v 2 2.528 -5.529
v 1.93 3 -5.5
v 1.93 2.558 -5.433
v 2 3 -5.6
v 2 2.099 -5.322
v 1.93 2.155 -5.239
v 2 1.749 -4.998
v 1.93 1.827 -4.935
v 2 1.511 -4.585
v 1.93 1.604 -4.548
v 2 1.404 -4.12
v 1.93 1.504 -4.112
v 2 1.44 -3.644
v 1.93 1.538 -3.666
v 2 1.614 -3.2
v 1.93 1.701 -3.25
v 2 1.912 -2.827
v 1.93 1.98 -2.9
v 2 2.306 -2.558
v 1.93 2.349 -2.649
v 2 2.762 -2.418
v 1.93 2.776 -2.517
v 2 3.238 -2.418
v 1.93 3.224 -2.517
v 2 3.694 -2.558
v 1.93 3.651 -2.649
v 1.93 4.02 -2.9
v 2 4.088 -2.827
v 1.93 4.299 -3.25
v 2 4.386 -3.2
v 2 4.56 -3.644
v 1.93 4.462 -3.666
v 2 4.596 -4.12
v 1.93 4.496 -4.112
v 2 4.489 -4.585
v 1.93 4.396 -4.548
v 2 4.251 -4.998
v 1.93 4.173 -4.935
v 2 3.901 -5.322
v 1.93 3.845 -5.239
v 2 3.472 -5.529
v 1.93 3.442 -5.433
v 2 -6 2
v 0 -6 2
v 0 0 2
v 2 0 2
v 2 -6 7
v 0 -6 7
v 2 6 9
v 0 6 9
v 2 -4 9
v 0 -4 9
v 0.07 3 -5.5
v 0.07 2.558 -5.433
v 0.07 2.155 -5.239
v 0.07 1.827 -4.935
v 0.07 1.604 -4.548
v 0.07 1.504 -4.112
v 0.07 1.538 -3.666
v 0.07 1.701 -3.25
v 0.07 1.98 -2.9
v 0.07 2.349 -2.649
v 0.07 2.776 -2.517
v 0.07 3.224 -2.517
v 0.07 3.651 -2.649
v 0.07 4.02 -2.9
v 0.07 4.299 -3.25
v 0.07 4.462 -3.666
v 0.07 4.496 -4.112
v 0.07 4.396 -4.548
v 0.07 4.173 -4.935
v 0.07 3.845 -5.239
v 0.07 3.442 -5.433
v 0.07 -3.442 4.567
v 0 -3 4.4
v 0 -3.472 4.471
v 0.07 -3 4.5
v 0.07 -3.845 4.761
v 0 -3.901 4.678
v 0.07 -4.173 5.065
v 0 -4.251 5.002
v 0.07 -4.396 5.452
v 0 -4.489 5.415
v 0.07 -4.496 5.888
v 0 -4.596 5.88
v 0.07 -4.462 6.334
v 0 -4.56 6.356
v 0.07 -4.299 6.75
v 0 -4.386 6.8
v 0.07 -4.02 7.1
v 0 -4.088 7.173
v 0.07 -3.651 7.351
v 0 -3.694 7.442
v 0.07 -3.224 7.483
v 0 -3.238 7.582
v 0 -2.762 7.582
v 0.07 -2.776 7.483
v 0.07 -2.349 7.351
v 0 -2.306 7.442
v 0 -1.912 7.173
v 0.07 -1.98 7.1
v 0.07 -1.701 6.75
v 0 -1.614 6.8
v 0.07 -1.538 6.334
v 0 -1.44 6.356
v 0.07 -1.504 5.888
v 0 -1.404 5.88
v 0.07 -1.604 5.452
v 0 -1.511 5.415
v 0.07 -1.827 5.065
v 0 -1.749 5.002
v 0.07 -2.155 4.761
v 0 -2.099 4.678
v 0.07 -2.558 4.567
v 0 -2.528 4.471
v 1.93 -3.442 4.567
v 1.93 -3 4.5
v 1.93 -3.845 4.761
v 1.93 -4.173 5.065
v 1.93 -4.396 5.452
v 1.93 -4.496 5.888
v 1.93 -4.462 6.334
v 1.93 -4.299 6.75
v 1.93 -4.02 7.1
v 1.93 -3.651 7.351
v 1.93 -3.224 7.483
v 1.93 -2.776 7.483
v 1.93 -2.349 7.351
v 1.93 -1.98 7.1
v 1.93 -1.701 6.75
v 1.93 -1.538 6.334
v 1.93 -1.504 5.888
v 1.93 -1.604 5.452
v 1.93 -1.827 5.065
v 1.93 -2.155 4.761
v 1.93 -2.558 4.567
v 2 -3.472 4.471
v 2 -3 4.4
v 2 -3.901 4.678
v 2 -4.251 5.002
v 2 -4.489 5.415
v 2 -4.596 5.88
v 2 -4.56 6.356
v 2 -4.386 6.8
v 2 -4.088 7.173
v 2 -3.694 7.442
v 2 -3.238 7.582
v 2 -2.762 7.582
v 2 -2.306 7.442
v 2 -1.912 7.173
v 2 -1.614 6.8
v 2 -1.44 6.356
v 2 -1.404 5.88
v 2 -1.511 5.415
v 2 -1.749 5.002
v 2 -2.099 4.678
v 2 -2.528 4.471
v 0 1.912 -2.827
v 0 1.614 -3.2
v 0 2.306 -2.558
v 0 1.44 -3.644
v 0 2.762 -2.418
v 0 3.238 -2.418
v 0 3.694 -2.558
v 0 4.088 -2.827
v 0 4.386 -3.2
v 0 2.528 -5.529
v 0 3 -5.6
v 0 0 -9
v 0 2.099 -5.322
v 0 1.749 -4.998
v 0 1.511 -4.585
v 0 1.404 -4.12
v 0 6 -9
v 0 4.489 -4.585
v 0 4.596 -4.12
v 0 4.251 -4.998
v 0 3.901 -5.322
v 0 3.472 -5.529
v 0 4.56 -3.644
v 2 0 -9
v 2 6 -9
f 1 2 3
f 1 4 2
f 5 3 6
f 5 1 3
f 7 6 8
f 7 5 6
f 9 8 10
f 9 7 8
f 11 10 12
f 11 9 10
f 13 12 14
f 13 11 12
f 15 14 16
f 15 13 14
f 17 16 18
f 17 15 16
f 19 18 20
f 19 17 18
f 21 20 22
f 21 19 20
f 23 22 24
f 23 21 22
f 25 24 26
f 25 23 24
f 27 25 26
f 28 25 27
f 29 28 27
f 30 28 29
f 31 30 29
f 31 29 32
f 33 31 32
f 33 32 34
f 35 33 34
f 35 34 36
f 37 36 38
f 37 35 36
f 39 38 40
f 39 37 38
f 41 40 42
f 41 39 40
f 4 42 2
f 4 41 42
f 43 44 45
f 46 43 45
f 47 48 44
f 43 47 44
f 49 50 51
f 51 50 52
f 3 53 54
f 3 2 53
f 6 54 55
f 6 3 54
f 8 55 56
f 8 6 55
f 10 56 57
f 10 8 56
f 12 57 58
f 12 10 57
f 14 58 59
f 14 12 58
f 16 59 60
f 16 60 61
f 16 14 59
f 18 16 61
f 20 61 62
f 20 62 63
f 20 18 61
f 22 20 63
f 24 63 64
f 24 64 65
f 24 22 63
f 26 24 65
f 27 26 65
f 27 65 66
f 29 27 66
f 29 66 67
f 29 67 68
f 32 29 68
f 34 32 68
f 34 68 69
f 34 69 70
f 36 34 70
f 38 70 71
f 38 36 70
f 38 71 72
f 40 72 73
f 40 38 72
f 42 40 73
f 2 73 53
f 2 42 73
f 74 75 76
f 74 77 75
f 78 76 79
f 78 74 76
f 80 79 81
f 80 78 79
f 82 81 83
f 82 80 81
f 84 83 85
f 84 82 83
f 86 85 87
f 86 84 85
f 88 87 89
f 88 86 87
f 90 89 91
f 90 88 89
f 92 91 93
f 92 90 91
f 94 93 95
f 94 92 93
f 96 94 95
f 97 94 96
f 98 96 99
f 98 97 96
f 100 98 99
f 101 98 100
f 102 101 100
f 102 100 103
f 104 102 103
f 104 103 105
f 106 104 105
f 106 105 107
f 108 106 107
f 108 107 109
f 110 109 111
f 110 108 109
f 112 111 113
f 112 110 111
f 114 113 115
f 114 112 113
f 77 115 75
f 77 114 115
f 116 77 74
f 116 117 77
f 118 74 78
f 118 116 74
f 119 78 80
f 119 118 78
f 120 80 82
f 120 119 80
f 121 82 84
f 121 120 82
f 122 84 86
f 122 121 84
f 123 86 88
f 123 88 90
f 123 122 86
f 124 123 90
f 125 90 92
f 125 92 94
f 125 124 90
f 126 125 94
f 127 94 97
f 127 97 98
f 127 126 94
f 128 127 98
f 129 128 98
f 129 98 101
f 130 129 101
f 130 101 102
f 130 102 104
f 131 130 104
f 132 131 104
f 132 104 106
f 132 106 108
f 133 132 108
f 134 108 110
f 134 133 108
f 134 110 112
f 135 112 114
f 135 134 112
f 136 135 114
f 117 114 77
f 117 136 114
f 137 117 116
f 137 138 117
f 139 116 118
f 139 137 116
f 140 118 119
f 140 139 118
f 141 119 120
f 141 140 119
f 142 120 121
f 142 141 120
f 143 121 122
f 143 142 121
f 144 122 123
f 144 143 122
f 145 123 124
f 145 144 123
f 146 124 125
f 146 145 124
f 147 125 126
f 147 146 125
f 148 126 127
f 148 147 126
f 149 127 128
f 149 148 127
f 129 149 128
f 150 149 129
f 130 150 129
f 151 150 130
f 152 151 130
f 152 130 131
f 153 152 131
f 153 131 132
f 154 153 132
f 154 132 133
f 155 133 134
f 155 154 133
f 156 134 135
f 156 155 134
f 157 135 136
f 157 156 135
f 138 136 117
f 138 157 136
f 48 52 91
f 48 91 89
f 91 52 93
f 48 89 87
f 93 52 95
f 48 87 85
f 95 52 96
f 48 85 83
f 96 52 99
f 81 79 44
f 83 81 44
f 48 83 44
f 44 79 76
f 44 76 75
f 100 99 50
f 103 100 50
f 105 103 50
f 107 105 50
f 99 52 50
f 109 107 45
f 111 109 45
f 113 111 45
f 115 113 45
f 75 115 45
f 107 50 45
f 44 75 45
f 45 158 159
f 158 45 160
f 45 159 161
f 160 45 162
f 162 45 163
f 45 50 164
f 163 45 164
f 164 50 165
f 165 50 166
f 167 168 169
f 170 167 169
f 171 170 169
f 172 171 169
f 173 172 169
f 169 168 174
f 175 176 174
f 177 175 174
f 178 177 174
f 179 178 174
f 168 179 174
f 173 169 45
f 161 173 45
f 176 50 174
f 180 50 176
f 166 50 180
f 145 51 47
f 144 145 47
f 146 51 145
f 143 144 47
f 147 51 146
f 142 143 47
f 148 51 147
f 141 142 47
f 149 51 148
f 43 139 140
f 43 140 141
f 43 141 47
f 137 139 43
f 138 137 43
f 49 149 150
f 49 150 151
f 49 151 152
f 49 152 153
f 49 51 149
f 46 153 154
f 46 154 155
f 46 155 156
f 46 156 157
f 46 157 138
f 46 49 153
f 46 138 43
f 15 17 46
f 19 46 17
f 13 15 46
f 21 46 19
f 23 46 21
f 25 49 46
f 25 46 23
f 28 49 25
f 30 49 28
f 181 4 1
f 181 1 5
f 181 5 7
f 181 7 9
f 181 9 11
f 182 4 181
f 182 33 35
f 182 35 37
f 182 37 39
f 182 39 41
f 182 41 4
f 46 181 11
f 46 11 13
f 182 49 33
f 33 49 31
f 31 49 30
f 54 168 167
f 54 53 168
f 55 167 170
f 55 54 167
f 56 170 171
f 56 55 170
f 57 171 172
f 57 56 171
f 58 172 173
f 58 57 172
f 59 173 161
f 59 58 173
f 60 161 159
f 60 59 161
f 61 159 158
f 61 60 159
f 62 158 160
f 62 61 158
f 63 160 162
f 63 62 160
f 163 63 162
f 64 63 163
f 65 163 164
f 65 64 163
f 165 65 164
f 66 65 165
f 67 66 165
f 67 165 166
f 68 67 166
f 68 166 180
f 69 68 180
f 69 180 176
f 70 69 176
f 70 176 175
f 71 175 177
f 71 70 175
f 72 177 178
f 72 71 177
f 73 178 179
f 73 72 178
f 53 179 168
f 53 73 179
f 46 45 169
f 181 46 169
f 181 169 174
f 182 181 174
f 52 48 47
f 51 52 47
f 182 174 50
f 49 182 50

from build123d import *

# Parameters (mm, degrees)
EXTRUDE_1_DEPTH            = 2
HOLE_WIZARD_M31_AT_2_COUNT = 2
HOLE_WIZARD_M31_AT_2_PITCH = 11.66190379
CHAMFER_2_SIZE             = 2


with BuildPart() as part:
    # Эскиз1 → Бобышка-Вытянуть1 (new body)
    with BuildSketch(Plane(origin=(0, 0, 0), x_dir=(0, 0, -1), z_dir=(1, 0, 0))):
        Polygon((-9, -6), (-2, -6), (-2, 0), (9, 0), (9, 6), (-9, 6), align=None)
    extrude(amount=EXTRUDE_1_DEPTH)

    # Эскиз2 → Отверстие обработанное метчиком M31 (revolve, cut)
    with BuildSketch(Plane(origin=(2, 3, -4), x_dir=(0, 0, -1), z_dir=(0, 1, 0))):
        Polygon((0, 0), (0, 2), (1.6, 2), (1.5, 1.929979246), (1.5, 0.070020754), (1.6, 0), align=None)
    hole_wizard_m31 = revolve(axis=Axis((8.35, 3, -4), (-1, 0, 0)), mode=Mode.SUBTRACT)

    # Отверстие обработанное метчиком M31 at 2: Отверстие обработанное метчиком M31 ×2
    with Locations(*[Vector(0, -0.514495755, 0.857492926) * (i * HOLE_WIZARD_M31_AT_2_PITCH) for i in range(1, HOLE_WIZARD_M31_AT_2_COUNT)]):
        add(hole_wizard_m31, mode=Mode.SUBTRACT)

    # Фаска2
    chamfer_2_edges = [part.edges().sort_by_distance(p)[0] for p in [
        (1, -6, 9),
    ]]
    chamfer(chamfer_2_edges, length=CHAMFER_2_SIZE)


solid = part.part
